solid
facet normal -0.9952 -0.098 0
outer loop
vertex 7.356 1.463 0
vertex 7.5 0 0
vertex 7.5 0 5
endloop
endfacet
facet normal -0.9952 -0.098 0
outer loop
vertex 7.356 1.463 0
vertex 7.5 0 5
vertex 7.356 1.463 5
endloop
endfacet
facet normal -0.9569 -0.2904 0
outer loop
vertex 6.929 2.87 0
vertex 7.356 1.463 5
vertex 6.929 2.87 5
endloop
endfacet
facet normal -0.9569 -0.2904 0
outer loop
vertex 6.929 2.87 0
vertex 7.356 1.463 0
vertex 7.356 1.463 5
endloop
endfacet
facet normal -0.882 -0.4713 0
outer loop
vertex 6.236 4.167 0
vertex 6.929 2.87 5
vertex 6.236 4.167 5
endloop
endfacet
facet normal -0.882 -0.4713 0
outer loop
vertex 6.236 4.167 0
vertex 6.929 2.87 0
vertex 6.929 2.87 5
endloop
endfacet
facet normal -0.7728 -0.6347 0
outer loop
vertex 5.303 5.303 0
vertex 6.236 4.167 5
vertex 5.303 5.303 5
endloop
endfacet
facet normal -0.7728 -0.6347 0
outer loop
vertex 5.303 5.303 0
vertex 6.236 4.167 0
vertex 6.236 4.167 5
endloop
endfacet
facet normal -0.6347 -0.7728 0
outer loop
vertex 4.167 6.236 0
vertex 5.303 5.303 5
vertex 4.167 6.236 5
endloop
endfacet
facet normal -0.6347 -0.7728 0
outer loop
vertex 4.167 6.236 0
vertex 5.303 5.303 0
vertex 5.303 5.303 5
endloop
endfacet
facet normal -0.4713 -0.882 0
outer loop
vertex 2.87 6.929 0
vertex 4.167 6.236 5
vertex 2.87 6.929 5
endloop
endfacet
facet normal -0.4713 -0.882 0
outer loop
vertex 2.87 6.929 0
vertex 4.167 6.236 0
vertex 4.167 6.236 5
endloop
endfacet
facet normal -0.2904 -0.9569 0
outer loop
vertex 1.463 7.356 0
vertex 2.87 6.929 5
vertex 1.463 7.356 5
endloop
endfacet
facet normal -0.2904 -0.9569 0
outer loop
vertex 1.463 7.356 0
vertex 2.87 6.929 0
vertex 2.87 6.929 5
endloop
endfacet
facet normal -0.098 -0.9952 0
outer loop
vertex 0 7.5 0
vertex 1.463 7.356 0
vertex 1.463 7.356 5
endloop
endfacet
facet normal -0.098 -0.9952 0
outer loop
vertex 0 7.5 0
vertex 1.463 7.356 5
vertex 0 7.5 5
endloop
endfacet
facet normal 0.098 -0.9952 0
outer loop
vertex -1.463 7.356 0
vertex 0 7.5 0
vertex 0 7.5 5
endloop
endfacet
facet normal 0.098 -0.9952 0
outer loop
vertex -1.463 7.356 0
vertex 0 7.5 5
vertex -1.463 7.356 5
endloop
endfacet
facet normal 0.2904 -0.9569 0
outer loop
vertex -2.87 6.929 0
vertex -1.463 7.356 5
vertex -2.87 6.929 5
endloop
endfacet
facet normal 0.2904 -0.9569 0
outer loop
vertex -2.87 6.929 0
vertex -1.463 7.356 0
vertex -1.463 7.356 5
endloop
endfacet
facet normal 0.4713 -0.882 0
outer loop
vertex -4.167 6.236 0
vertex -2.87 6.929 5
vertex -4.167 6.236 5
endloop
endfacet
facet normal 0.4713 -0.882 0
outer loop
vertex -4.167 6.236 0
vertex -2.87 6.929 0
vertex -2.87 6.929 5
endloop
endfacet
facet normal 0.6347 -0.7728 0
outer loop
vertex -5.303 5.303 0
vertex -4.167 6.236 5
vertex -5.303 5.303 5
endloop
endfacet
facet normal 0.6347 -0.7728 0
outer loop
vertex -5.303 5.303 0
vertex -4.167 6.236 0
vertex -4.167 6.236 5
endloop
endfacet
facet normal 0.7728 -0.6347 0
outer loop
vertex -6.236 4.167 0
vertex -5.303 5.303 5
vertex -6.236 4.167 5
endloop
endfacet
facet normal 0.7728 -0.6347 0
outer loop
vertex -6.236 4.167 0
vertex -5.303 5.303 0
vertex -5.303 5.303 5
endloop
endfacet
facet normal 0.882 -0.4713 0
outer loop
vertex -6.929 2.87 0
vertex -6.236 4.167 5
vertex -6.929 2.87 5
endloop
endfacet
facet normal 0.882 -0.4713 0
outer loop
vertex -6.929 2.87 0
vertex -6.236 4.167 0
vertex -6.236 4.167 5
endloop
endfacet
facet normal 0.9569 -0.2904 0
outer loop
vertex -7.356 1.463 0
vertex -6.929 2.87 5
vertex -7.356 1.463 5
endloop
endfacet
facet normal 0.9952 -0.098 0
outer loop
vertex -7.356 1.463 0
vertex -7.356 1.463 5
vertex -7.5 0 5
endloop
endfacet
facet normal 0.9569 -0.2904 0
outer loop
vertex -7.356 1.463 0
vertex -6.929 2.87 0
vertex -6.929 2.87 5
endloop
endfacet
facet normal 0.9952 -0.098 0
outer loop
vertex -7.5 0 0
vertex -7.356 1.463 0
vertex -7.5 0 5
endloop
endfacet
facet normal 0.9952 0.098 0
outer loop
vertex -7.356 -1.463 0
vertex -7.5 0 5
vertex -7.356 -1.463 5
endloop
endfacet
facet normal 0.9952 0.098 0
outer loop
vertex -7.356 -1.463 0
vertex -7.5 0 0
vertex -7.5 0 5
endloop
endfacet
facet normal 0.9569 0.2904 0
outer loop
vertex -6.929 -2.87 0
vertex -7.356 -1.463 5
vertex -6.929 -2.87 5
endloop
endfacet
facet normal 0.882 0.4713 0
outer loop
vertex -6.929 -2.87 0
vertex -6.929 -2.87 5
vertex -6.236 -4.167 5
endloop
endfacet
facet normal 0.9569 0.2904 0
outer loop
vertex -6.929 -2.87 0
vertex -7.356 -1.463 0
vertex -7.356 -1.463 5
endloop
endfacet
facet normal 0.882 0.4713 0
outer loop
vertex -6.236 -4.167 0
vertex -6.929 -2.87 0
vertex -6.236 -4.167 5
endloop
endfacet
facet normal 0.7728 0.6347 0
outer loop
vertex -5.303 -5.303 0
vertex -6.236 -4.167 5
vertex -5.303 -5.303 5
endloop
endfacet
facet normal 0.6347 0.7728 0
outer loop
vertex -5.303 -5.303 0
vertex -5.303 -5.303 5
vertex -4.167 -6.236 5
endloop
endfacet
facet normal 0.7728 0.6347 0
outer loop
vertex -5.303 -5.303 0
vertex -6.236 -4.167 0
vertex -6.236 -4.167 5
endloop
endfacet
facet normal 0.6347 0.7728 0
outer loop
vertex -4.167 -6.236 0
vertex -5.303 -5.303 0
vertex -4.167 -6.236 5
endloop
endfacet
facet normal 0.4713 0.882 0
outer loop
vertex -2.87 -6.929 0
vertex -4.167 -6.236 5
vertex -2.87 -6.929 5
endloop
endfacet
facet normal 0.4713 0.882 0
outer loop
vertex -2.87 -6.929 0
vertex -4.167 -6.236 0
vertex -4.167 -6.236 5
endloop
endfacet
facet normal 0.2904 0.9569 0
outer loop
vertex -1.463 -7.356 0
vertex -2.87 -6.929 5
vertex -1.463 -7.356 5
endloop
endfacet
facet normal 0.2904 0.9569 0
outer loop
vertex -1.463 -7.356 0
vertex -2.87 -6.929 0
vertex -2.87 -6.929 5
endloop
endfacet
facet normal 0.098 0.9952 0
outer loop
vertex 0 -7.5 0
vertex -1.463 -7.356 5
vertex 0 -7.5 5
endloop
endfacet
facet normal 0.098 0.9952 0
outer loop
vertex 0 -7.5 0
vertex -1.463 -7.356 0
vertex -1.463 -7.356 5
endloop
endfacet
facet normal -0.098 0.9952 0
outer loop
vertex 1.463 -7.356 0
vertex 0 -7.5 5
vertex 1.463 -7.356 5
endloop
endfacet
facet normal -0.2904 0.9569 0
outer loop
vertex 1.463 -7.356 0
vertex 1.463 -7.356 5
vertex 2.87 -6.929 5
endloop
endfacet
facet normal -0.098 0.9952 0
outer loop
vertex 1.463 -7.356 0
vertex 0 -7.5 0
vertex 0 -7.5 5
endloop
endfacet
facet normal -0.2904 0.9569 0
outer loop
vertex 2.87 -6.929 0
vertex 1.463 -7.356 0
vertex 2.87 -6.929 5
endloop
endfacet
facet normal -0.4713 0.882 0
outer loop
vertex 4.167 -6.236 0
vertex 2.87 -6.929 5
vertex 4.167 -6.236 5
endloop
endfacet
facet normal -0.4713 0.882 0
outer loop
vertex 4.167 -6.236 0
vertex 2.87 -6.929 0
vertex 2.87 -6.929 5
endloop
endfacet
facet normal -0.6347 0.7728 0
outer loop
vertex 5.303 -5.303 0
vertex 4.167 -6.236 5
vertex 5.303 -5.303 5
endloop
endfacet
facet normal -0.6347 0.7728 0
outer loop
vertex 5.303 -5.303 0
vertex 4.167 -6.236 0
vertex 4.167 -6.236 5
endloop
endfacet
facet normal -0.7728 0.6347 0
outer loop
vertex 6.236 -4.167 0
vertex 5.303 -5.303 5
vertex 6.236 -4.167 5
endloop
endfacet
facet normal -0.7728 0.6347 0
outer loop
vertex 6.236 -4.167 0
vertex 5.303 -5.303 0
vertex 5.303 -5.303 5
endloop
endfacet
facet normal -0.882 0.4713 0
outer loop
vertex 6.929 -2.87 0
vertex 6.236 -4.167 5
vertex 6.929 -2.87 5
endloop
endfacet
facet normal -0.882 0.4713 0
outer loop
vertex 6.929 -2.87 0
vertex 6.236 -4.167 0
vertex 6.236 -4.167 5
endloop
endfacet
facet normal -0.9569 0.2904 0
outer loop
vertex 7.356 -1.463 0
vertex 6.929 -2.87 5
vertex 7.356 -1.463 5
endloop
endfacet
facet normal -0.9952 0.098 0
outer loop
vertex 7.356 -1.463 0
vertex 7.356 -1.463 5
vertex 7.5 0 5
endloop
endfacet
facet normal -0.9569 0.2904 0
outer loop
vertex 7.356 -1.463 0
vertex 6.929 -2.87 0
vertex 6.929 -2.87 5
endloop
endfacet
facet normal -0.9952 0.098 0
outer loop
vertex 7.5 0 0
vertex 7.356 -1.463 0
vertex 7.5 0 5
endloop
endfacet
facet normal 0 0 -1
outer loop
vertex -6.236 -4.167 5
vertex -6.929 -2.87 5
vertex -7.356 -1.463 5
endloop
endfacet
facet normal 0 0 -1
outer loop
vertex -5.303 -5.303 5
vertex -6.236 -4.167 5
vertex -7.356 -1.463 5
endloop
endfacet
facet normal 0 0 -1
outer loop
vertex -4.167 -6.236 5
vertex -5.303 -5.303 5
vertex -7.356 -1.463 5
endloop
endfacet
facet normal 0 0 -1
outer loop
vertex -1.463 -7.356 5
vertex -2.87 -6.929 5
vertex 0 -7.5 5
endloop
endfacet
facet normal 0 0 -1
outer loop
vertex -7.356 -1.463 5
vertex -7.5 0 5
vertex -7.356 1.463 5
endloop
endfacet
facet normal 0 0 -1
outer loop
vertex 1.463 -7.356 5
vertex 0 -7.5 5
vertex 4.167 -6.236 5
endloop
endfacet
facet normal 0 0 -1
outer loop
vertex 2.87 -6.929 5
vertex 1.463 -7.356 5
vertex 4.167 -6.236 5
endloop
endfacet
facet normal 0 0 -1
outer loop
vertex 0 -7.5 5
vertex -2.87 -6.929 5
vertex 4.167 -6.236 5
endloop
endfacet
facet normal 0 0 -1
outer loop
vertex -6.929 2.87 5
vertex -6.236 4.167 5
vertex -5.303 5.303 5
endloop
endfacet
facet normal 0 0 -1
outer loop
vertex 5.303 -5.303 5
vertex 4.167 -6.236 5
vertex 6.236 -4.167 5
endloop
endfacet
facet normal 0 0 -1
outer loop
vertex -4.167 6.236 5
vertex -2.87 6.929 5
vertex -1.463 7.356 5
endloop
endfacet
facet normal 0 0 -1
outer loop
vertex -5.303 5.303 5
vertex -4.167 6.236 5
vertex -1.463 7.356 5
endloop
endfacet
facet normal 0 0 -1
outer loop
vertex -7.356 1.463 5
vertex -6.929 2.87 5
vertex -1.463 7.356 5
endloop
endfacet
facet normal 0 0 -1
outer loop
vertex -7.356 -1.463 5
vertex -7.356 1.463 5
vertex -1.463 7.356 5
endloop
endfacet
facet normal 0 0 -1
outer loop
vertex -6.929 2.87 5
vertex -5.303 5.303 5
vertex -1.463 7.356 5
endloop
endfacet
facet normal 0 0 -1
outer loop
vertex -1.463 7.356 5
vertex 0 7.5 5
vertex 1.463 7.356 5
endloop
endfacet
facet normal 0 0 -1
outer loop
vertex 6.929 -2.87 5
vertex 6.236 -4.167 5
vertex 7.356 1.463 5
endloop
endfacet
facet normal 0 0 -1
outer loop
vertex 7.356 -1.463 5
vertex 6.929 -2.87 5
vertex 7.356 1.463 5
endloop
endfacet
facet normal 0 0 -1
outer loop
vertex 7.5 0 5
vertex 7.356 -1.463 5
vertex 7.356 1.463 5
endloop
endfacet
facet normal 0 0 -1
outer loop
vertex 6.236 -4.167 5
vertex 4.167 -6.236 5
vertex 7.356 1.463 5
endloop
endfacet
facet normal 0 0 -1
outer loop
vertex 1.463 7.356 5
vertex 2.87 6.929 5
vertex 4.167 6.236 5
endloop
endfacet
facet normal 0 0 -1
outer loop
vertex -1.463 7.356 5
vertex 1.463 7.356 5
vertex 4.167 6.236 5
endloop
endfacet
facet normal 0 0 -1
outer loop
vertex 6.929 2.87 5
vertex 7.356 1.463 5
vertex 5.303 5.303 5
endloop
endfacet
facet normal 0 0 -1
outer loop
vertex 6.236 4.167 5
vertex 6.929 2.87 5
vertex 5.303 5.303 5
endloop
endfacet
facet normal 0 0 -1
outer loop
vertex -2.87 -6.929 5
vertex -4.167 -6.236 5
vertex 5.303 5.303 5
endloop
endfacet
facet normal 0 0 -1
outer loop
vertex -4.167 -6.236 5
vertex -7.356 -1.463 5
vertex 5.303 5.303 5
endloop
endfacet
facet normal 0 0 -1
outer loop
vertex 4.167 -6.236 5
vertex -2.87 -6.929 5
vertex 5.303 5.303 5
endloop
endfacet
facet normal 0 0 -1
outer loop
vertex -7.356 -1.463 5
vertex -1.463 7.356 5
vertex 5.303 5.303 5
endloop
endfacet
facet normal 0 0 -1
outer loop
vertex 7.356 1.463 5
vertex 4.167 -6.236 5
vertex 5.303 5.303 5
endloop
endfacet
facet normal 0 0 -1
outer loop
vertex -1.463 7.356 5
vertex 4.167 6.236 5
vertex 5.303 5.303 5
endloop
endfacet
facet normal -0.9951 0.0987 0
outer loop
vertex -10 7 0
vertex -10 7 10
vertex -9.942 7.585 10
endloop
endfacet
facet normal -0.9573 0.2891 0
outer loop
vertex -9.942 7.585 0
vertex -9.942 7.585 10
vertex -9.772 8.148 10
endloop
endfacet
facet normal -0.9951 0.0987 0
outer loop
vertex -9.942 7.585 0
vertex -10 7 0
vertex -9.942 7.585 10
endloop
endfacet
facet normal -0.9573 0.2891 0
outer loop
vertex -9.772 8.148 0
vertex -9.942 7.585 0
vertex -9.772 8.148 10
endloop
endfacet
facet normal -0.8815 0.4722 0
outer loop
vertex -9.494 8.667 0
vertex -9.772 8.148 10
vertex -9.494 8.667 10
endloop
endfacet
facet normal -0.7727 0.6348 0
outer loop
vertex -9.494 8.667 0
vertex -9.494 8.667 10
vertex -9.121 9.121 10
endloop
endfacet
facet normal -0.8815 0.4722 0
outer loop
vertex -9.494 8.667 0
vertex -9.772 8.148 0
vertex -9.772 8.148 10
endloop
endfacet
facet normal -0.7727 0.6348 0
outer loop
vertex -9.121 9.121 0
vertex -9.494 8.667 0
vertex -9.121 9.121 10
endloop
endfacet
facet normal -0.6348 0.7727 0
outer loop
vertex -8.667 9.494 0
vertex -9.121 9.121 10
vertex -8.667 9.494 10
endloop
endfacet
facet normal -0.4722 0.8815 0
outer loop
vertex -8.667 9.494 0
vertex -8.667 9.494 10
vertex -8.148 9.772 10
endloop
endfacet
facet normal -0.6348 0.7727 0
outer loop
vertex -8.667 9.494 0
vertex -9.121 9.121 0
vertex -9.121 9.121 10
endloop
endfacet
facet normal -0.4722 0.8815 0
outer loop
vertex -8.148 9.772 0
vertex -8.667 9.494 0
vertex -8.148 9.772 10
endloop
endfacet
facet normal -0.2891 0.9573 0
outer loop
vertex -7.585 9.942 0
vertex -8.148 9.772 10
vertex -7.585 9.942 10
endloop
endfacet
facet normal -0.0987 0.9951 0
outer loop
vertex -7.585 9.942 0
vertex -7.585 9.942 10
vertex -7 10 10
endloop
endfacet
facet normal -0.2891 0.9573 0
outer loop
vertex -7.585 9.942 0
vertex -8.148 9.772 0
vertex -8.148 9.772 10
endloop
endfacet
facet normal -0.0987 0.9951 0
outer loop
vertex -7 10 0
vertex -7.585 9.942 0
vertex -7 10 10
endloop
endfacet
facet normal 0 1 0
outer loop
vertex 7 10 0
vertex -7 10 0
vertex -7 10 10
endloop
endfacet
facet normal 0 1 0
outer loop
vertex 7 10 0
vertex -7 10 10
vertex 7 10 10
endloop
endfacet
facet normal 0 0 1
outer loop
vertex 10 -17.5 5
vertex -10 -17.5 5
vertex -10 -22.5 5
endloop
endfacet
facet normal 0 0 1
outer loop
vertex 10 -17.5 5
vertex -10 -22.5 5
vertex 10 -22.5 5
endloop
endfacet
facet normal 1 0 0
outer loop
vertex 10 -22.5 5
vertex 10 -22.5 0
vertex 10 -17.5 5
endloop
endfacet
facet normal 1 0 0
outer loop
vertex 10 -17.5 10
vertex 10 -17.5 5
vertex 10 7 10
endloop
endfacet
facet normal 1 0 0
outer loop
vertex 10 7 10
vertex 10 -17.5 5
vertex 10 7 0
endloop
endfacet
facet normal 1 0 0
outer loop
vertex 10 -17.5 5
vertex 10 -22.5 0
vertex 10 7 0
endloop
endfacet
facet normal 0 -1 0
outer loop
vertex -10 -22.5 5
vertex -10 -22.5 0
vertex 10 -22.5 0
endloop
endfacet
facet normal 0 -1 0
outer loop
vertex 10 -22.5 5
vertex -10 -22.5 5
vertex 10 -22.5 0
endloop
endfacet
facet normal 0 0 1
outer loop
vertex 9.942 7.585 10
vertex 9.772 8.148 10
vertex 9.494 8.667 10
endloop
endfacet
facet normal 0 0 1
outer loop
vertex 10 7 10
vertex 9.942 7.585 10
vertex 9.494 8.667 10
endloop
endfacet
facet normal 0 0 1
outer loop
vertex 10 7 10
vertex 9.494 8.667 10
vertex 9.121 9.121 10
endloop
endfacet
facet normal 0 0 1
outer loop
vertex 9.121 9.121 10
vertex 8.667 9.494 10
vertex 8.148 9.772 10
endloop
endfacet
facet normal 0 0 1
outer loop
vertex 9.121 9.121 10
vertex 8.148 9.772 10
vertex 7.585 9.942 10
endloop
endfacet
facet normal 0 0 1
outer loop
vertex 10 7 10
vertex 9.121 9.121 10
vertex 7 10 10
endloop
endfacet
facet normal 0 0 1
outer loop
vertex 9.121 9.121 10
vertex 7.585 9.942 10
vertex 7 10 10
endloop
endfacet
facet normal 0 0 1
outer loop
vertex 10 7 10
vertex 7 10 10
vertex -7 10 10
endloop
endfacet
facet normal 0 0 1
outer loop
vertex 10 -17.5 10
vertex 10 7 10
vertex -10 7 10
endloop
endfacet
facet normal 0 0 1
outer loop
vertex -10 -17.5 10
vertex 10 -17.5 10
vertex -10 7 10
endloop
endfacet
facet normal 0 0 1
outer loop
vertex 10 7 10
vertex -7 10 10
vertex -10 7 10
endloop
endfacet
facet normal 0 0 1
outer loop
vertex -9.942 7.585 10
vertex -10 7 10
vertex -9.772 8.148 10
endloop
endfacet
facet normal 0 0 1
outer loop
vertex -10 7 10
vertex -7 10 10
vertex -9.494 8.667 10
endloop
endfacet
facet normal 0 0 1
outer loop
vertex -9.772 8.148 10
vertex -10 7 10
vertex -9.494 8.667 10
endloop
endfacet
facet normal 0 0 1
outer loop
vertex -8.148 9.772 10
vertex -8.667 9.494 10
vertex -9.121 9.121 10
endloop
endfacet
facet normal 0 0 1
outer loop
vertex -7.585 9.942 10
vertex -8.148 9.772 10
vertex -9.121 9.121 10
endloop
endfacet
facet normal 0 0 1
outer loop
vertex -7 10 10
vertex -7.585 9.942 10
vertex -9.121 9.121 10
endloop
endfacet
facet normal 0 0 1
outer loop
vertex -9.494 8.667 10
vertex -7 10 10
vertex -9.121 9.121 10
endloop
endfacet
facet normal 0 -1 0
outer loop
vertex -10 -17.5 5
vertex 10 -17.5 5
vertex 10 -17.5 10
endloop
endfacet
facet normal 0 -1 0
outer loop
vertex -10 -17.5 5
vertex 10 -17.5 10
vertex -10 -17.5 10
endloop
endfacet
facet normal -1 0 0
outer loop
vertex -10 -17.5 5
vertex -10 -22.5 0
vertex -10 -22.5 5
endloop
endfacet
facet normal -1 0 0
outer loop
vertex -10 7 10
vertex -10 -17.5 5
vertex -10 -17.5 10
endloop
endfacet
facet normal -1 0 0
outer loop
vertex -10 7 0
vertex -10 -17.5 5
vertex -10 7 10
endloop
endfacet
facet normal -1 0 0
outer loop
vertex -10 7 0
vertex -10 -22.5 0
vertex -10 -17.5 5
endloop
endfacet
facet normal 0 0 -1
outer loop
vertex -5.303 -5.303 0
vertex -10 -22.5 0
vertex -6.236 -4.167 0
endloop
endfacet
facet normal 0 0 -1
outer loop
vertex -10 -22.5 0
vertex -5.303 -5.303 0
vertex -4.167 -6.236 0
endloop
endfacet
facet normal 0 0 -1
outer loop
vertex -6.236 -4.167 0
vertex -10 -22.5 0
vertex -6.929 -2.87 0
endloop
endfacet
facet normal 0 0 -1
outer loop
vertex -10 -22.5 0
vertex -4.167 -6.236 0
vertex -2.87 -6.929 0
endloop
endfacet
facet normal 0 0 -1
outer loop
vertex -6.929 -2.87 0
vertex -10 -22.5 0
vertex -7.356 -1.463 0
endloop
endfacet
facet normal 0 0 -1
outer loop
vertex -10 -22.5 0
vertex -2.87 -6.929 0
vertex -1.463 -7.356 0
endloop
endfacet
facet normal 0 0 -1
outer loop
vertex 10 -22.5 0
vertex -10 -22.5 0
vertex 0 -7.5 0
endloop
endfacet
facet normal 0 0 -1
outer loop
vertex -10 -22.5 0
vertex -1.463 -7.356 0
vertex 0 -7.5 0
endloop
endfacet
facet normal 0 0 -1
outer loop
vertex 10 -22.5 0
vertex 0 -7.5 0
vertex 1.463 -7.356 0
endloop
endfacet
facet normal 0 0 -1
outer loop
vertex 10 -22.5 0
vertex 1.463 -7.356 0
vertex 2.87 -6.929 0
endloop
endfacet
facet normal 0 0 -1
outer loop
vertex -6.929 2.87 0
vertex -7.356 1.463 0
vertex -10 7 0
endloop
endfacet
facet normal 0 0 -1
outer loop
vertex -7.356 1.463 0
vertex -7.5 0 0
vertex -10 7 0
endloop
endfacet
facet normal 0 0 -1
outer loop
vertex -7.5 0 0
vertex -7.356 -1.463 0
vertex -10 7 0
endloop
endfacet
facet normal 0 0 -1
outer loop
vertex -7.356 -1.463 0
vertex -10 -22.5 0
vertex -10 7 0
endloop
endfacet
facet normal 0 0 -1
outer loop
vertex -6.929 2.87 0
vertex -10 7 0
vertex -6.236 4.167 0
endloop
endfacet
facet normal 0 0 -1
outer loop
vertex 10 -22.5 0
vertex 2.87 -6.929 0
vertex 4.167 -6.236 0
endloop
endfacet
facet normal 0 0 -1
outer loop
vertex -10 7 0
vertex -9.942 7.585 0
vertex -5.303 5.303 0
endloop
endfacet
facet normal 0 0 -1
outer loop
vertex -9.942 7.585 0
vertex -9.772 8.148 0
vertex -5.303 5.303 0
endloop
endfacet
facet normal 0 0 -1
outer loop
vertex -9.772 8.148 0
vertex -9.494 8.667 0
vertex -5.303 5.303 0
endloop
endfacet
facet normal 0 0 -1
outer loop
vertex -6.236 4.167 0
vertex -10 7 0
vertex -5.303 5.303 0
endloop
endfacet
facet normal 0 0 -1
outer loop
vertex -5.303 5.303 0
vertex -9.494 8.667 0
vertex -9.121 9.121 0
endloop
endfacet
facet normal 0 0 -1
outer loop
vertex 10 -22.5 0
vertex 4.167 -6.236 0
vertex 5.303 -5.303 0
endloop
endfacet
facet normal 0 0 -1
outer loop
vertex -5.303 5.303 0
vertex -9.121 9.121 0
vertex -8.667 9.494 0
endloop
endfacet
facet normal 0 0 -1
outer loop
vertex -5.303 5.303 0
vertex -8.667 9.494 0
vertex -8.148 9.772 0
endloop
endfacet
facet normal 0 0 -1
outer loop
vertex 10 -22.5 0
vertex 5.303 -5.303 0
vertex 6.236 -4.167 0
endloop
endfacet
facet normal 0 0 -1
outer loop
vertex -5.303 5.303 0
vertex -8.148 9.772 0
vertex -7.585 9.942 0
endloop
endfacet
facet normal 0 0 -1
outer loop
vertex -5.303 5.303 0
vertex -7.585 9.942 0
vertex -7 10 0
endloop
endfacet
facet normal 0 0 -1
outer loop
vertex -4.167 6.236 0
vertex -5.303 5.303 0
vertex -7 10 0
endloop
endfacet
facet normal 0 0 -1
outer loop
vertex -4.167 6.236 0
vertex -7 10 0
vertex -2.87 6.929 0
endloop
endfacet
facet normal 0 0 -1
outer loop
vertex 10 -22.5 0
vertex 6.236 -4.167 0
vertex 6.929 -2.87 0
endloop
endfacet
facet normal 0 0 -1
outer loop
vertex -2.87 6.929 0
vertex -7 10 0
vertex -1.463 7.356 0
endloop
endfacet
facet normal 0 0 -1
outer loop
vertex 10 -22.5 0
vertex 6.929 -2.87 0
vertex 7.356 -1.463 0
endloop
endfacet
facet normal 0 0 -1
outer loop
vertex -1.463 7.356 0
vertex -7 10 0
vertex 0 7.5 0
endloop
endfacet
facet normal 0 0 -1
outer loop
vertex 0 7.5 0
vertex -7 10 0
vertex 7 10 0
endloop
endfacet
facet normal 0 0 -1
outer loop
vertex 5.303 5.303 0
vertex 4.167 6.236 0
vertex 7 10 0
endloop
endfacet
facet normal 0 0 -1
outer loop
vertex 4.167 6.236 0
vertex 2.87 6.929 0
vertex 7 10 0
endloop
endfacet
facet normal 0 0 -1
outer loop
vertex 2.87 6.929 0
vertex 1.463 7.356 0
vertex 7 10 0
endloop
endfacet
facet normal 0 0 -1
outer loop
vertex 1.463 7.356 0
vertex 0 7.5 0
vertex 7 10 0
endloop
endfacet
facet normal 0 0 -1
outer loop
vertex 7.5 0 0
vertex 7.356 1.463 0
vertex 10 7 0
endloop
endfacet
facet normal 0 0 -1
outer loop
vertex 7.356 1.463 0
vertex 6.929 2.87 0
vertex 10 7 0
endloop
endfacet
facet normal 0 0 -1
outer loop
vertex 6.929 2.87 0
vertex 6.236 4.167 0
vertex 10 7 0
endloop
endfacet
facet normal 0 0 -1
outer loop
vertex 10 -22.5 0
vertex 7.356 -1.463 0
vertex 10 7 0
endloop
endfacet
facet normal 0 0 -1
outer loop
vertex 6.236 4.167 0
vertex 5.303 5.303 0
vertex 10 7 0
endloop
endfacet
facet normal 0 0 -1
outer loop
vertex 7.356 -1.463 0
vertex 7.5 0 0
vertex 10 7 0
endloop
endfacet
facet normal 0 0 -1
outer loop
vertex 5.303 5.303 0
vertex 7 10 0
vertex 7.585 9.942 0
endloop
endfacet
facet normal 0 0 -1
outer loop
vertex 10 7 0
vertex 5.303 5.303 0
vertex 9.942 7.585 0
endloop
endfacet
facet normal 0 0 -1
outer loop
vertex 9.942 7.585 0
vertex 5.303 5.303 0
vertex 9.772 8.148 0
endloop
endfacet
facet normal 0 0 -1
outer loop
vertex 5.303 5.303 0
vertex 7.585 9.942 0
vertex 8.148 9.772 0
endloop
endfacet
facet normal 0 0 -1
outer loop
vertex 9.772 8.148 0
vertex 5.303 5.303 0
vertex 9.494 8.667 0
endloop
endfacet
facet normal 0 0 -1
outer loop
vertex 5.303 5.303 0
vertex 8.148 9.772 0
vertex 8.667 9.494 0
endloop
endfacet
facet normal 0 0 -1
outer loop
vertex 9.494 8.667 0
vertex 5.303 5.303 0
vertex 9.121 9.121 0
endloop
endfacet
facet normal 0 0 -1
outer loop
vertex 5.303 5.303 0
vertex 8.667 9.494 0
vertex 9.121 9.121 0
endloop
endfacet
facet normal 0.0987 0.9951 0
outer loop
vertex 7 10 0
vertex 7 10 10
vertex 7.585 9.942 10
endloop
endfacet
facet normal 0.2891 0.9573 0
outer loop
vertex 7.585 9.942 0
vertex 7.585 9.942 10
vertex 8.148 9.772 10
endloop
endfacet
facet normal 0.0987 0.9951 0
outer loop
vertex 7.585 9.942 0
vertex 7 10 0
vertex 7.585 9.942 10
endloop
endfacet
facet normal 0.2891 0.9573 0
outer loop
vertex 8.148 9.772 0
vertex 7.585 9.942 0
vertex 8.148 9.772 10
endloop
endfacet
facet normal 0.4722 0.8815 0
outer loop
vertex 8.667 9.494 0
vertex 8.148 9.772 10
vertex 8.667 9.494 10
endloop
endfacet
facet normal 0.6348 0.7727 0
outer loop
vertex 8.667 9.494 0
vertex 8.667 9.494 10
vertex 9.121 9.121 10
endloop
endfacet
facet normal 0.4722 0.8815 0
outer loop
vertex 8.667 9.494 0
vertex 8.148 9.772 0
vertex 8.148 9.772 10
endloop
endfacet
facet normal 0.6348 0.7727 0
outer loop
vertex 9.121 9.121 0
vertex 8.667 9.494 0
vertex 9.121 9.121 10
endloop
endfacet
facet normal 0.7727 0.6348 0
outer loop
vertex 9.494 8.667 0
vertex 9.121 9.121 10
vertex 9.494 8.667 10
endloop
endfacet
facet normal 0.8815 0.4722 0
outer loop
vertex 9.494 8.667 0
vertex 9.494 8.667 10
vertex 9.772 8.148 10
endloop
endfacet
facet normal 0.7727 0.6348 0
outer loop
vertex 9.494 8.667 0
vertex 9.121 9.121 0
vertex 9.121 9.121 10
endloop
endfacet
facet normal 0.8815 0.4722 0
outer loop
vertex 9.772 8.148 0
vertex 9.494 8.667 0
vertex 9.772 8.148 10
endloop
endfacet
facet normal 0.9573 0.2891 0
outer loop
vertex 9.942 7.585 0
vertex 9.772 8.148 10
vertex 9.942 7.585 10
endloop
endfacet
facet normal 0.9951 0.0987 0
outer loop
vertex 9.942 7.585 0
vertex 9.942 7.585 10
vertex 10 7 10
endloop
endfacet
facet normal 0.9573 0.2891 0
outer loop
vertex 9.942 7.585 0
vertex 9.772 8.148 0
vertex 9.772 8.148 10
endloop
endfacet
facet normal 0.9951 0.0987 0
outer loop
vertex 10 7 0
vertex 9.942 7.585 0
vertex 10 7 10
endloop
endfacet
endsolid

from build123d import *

# Parameters (mm, degrees)
SKETCH_1_R          = 7.5
EXTRUDE_1_DEPTH     = 10
SKETCH_1_3_W        = 20
SKETCH_1_3_H        = 5
EXTRUDE_2_DEPTH     = 5
SKETCH_1_4_R        = 7.5
CUT_EXTRUDE_1_DEPTH = 5


with BuildPart() as part:
    # Sketch 1 → Extrude 1 (new body)
    with BuildSketch(Plane.XY):
        with BuildLine():
            Line((-7, 10), (7, 10))
            ThreePointArc((7, 10), (9.121320344, 9.121320344), (10, 7))
            Line((10, 7), (10, -17.5))
            Line((10, -17.5), (-10, -17.5))
            Line((-10, -17.5), (-10, 7))
            ThreePointArc((-10, 7), (-9.121320344, 9.121320344), (-7, 10))
        make_face()
        Circle(SKETCH_1_R, mode=Mode.SUBTRACT)
        Circle(SKETCH_1_R)
    extrude(amount=EXTRUDE_1_DEPTH)

    # Sketch 1_3 → Extrude 2 (add)
    with BuildSketch(Plane.XY):
        with Locations((0, -20)):
            Rectangle(SKETCH_1_3_W, SKETCH_1_3_H)
    extrude(amount=EXTRUDE_2_DEPTH)

    # Sketch 1_4 → Cut-Extrude 1 (cut)
    with BuildSketch(Plane.XY):
        Circle(SKETCH_1_4_R)
    extrude(amount=CUT_EXTRUDE_1_DEPTH, mode=Mode.SUBTRACT)


solid = part.part
